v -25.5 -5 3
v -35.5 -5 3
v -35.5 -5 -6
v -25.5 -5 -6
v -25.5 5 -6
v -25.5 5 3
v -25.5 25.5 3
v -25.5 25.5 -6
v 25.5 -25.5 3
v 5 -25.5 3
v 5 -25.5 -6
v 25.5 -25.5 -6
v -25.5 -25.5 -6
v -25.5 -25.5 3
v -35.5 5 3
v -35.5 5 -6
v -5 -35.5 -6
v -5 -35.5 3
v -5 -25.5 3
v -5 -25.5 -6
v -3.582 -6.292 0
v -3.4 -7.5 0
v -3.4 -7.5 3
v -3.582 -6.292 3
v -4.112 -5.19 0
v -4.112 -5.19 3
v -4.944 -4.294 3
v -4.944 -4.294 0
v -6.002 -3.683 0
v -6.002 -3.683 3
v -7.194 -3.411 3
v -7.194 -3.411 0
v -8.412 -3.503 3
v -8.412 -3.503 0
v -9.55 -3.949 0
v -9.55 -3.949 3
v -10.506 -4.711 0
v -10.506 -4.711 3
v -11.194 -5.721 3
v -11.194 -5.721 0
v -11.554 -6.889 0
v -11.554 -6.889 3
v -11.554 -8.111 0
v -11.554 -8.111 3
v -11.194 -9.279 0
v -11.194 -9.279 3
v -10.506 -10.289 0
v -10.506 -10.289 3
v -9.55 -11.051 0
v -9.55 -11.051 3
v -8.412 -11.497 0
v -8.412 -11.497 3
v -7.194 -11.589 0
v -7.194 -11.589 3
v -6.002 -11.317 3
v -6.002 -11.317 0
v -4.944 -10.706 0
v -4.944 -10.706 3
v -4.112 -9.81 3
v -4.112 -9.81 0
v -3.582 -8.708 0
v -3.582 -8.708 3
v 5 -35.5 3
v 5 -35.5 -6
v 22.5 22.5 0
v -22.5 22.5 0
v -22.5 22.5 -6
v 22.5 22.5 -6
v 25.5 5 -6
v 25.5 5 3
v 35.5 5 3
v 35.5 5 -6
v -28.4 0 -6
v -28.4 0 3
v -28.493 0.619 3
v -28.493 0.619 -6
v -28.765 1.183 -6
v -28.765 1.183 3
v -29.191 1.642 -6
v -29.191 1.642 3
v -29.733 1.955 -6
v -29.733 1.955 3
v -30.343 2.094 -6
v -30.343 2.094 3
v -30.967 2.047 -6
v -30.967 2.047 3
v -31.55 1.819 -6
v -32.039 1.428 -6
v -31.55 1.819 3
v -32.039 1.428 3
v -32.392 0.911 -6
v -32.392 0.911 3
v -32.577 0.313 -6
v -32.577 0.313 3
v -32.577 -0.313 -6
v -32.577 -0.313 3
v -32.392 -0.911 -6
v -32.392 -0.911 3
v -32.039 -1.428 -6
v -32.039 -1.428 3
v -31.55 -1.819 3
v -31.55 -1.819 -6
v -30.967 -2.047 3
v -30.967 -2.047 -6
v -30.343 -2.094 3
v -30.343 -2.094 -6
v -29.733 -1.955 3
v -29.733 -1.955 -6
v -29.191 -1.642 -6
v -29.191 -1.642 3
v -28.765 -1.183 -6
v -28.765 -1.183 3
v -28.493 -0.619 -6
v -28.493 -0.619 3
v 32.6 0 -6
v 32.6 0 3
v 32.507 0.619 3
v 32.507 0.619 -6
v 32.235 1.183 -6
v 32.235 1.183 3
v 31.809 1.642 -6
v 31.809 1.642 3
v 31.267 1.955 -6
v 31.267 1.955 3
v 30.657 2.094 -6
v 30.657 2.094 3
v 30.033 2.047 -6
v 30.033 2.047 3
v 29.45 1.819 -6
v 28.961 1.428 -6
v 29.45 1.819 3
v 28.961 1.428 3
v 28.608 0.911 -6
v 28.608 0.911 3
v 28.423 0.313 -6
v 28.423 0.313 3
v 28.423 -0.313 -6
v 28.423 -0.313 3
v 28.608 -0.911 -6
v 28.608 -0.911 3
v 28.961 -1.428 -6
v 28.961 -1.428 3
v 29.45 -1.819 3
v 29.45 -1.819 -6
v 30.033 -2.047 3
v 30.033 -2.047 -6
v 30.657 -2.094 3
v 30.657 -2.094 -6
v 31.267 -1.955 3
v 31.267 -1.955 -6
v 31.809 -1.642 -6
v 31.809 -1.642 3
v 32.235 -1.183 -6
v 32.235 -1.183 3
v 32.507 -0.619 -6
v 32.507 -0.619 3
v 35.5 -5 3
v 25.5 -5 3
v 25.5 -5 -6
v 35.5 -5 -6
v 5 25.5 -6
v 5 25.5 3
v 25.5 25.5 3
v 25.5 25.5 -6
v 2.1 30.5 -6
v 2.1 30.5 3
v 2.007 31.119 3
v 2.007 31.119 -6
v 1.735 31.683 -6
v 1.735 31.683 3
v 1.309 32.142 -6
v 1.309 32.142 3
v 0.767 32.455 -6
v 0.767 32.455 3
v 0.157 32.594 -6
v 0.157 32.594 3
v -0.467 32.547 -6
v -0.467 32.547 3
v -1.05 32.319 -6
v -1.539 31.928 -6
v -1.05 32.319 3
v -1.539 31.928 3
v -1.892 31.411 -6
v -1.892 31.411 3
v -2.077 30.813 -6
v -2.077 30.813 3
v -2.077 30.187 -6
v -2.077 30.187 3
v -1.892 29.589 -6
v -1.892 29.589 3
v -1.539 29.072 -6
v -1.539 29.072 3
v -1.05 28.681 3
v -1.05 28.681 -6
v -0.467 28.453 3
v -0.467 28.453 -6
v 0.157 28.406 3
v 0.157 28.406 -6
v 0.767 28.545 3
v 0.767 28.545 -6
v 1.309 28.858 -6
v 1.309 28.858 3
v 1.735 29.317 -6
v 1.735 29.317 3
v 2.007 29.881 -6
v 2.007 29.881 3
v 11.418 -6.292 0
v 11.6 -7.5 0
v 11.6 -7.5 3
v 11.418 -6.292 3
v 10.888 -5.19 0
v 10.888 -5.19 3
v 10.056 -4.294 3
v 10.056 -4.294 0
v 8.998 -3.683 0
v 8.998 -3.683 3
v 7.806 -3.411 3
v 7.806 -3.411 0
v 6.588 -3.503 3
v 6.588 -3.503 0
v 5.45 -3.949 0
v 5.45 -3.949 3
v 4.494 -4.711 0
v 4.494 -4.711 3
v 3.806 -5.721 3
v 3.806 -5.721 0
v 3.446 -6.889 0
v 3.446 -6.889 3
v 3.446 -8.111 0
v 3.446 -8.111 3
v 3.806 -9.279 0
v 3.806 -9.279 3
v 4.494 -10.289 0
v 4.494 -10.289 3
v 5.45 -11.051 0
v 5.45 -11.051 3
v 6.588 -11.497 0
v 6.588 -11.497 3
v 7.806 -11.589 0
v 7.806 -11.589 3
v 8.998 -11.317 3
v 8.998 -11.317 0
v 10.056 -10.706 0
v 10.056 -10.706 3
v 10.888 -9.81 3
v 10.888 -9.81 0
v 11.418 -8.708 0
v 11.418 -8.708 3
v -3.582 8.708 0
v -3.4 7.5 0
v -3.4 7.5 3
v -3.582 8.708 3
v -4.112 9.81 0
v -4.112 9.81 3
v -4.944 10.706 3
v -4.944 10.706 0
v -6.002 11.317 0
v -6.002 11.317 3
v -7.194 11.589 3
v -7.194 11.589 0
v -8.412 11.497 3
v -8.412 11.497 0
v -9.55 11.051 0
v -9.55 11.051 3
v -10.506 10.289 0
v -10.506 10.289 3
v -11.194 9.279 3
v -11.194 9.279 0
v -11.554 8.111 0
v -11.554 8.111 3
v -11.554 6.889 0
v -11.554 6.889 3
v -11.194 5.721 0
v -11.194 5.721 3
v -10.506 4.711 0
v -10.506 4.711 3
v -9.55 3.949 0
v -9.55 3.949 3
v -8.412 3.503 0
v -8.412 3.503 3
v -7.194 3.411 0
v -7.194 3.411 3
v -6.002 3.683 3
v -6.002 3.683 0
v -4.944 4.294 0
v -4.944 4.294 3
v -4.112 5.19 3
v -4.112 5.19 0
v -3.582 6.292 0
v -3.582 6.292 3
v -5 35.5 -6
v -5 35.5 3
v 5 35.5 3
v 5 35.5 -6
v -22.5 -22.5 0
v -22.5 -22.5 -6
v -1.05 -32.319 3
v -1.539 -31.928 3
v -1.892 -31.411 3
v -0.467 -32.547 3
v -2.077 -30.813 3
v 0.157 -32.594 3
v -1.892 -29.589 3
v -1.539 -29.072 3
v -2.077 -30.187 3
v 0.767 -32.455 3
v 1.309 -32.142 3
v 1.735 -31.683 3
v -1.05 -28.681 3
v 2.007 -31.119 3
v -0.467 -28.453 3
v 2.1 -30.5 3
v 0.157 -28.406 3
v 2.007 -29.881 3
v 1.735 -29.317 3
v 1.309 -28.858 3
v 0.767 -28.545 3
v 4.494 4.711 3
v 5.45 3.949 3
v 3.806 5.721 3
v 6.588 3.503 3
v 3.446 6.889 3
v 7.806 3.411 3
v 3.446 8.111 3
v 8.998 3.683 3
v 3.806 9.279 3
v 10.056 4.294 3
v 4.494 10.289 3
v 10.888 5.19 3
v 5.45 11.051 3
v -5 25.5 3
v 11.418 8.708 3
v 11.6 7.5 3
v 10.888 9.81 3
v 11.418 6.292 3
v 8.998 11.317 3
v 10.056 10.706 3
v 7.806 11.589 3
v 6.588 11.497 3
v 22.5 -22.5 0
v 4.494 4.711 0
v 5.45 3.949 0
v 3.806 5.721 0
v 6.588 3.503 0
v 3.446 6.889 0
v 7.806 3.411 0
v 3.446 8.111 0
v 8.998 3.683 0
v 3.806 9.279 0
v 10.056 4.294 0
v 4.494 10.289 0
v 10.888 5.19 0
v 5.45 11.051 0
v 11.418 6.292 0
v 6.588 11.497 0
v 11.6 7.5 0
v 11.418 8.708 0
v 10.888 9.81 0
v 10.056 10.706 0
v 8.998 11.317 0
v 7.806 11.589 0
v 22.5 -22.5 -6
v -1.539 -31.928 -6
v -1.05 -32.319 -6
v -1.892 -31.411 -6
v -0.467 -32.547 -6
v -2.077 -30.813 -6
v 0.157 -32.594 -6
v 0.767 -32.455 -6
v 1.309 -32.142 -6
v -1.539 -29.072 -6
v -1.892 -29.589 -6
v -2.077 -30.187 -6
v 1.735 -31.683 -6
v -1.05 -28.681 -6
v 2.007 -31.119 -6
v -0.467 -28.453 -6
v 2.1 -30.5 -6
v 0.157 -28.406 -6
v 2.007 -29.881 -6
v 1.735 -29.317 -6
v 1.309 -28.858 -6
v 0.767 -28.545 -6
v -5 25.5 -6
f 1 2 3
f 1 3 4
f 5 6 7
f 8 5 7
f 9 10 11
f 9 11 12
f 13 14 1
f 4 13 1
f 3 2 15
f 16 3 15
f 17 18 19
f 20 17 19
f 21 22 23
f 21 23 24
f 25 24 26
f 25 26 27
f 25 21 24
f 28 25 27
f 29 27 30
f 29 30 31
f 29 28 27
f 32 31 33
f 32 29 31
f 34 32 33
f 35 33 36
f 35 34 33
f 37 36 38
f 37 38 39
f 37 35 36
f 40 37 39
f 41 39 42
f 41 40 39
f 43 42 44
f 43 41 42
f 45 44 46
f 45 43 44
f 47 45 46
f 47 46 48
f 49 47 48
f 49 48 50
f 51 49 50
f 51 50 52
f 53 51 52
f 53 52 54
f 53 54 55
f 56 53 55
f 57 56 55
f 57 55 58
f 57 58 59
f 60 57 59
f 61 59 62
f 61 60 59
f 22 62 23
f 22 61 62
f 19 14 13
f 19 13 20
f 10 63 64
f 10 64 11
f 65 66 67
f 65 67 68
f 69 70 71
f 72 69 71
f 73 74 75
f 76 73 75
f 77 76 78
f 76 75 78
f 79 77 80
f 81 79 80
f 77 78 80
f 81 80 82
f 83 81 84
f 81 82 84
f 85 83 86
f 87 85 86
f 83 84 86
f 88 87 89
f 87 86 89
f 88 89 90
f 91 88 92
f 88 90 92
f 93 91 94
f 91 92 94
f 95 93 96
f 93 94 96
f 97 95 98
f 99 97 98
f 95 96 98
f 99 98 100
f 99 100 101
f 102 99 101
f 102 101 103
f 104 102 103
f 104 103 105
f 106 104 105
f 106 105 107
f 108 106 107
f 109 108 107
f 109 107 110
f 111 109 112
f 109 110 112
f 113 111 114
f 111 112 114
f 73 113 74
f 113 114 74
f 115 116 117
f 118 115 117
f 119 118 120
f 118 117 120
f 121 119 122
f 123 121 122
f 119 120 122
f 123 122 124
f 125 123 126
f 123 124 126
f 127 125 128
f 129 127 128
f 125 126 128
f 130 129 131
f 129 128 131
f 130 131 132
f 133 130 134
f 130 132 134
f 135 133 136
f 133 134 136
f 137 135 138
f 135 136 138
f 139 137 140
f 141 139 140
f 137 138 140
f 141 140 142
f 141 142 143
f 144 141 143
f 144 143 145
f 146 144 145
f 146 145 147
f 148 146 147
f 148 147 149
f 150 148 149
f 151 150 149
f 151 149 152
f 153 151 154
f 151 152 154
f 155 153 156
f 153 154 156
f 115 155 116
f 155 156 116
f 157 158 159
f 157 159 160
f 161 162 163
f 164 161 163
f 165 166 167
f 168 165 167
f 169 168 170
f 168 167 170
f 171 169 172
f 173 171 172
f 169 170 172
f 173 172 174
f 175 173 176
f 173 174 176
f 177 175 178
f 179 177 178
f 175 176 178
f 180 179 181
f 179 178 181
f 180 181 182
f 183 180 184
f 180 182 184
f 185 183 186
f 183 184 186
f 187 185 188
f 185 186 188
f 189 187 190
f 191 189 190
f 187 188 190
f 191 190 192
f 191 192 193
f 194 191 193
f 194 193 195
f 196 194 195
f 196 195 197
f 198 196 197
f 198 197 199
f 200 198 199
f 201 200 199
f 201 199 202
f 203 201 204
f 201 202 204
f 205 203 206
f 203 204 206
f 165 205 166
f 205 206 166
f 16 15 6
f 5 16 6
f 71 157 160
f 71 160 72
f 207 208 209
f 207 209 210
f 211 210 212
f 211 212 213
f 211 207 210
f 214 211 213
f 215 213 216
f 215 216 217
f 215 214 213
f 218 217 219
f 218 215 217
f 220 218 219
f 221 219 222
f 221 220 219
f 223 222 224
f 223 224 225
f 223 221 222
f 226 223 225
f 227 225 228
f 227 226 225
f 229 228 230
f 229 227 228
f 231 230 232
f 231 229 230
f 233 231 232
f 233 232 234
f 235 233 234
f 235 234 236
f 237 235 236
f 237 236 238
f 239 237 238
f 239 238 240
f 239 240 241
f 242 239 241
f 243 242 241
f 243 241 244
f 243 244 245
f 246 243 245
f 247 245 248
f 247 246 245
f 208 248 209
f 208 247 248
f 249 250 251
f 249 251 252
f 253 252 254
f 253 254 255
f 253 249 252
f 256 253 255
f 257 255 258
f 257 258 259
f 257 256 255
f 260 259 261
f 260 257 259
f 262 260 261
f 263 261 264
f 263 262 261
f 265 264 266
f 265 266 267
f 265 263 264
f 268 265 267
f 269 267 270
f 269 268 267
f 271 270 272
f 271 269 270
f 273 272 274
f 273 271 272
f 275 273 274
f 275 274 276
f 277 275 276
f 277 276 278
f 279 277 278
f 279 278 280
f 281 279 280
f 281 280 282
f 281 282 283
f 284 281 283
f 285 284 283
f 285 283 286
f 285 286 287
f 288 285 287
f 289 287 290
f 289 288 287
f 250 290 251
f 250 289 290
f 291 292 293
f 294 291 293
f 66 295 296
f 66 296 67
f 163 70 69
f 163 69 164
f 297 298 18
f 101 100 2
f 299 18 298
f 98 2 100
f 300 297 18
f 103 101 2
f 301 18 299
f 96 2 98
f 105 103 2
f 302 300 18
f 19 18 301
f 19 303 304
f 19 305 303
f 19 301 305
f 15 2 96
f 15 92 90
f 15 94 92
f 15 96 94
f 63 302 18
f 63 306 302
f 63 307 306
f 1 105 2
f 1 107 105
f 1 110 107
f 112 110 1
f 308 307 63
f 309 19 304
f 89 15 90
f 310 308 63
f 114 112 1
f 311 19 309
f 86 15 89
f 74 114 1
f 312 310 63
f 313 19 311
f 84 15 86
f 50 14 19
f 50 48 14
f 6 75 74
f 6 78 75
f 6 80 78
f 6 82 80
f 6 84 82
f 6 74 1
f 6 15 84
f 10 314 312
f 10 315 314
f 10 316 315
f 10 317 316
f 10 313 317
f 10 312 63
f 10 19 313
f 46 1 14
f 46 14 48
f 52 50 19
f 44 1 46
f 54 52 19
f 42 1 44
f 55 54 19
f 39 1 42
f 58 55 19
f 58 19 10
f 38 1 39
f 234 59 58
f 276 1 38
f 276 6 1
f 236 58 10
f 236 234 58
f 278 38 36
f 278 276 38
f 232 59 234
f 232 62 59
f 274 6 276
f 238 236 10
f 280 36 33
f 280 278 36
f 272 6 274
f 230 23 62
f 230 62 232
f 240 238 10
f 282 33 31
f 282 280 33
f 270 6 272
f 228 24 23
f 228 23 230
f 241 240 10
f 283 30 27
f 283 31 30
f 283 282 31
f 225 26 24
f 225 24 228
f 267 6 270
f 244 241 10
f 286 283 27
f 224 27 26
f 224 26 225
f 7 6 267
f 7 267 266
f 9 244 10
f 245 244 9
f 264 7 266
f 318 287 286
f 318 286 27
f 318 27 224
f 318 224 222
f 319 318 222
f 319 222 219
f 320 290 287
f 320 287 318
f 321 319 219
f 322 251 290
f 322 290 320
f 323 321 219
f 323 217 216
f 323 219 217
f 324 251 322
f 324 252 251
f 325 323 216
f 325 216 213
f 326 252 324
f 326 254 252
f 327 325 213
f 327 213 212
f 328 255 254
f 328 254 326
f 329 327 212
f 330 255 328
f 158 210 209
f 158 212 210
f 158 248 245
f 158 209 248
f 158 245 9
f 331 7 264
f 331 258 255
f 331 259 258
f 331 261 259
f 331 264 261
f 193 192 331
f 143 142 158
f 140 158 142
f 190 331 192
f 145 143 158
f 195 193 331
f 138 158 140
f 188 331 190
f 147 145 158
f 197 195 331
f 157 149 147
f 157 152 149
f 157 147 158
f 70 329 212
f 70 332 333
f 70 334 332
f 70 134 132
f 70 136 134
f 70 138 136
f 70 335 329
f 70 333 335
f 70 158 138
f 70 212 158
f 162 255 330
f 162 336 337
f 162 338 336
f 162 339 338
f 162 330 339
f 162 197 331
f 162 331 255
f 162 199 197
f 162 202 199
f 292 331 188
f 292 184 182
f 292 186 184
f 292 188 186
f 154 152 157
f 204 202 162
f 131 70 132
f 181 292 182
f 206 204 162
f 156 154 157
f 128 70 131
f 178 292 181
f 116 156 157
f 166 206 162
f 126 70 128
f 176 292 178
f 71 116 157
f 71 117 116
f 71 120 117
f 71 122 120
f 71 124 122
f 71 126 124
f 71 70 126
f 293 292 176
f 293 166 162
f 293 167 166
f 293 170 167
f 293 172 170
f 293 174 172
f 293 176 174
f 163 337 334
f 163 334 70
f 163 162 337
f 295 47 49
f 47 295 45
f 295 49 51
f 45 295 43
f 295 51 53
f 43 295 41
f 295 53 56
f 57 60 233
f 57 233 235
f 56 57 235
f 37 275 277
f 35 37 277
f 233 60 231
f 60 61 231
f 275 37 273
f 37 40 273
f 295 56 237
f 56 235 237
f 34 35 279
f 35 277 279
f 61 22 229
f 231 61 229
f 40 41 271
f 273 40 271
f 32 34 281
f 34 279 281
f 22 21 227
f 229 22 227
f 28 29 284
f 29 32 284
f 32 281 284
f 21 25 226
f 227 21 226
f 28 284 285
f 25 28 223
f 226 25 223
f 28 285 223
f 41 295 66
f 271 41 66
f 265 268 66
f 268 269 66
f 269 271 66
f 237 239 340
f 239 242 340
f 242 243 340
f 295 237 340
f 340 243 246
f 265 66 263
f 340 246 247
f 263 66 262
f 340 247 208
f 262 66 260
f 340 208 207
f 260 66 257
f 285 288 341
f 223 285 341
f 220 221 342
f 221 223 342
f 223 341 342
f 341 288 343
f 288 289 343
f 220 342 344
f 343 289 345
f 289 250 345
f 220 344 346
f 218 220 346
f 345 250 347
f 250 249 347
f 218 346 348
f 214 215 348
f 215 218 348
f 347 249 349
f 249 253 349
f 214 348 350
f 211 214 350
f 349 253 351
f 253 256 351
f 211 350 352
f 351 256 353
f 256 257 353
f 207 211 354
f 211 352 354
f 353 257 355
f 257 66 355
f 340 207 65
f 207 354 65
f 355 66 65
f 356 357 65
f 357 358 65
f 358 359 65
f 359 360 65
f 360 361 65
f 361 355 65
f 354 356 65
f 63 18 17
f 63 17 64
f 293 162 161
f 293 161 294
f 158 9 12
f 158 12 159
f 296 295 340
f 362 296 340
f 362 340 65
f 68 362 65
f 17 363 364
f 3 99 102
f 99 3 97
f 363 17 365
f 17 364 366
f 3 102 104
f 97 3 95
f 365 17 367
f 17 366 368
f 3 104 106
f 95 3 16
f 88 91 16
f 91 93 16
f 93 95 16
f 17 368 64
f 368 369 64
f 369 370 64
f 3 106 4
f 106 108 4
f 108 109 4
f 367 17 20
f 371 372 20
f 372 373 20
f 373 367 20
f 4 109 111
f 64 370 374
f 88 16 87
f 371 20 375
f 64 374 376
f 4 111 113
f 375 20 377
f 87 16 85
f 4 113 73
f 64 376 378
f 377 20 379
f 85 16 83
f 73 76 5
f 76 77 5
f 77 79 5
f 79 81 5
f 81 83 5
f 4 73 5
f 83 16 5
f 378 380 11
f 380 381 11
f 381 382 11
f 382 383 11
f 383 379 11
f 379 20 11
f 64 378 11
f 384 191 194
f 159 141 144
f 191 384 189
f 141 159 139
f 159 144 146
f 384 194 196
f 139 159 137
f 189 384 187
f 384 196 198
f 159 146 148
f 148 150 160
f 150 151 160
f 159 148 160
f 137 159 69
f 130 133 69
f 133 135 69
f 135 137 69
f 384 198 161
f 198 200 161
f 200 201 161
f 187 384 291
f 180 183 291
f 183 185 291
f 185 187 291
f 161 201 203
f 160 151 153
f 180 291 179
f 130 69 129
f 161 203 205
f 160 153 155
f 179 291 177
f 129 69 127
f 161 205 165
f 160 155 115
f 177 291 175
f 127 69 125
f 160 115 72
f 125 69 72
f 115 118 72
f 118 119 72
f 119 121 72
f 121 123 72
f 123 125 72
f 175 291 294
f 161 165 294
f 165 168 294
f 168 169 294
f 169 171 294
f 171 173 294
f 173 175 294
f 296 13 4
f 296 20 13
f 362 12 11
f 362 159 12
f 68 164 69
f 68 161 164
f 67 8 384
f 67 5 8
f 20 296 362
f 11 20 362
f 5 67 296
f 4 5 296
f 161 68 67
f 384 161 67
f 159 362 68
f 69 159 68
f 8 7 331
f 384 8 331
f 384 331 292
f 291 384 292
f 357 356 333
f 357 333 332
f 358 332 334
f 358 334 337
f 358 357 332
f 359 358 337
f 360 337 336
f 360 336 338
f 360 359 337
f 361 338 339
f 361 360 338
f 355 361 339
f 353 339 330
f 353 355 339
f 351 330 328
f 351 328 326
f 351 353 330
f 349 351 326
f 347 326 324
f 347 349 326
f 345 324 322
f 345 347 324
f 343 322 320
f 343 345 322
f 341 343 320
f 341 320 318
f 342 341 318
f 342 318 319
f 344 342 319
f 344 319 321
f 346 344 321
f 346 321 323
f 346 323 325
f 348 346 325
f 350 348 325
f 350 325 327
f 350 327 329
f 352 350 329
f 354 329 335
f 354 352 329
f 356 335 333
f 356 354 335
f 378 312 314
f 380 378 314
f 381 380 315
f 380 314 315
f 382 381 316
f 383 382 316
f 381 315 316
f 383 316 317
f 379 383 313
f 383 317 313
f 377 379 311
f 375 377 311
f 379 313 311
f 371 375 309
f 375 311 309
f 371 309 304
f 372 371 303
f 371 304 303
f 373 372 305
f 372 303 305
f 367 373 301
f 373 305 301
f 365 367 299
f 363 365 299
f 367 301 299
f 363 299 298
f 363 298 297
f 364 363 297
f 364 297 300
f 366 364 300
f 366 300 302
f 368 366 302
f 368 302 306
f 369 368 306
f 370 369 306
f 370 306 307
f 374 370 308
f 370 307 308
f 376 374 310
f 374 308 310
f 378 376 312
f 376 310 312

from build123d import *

# Parameters (mm, degrees)
F0_W     = 45
F0_H     = 45
F0_R     = 4.1
F1_DEPTH = 3
F2_W     = 51
F2_H     = 51
F2_W_2   = 45
F2_H_2   = 45
F3_DEPTH = 9
F4_W     = 10
F4_H     = 10
F4_R     = 2.1
F5_DEPTH = 9


with BuildPart() as f1:
    # F0 (on Top) → F1 (new body)
    with BuildSketch(Plane.XY):
        Rectangle(F0_W, F0_H)
        with Locations((-7.5, -7.5)):
            Circle(F0_R, mode=Mode.SUBTRACT)
        with Locations((7.5, -7.5)):
            Circle(F0_R, mode=Mode.SUBTRACT)
        with Locations((-7.5, 7.5)):
            Circle(F0_R, mode=Mode.SUBTRACT)
        with Locations((7.5, 7.5)):
            Circle(F0_R, mode=Mode.SUBTRACT)
    extrude(amount=F1_DEPTH)

    # F2 (on face) → F3 (join)
    with BuildSketch(Plane.XY.offset(3)):
        Rectangle(F2_W, F2_H)
        Rectangle(F2_W_2, F2_H_2, mode=Mode.SUBTRACT)
    extrude(amount=-F3_DEPTH)

    # F4 (on face) → F5 (join)
    with BuildSketch(Plane.XY.offset(3)):
        with Locations((0, 30.5)):
            Rectangle(F4_W, F4_H)
        with Locations((0, 30.5)):
            Circle(F4_R, mode=Mode.SUBTRACT)
        with Locations((-30.5, 0)):
            Rectangle(F4_W, F4_H)
        with Locations((-30.5, 0)):
            Circle(F4_R, mode=Mode.SUBTRACT)
        with Locations((0, -30.5)):
            Rectangle(F4_W, F4_H)
        with Locations((0, -30.5)):
            Circle(F4_R, mode=Mode.SUBTRACT)
        with Locations((30.5, 0)):
            Rectangle(F4_W, F4_H)
        with Locations((30.5, 0)):
            Circle(F4_R, mode=Mode.SUBTRACT)
    extrude(amount=-F5_DEPTH)


solid = f1.part
